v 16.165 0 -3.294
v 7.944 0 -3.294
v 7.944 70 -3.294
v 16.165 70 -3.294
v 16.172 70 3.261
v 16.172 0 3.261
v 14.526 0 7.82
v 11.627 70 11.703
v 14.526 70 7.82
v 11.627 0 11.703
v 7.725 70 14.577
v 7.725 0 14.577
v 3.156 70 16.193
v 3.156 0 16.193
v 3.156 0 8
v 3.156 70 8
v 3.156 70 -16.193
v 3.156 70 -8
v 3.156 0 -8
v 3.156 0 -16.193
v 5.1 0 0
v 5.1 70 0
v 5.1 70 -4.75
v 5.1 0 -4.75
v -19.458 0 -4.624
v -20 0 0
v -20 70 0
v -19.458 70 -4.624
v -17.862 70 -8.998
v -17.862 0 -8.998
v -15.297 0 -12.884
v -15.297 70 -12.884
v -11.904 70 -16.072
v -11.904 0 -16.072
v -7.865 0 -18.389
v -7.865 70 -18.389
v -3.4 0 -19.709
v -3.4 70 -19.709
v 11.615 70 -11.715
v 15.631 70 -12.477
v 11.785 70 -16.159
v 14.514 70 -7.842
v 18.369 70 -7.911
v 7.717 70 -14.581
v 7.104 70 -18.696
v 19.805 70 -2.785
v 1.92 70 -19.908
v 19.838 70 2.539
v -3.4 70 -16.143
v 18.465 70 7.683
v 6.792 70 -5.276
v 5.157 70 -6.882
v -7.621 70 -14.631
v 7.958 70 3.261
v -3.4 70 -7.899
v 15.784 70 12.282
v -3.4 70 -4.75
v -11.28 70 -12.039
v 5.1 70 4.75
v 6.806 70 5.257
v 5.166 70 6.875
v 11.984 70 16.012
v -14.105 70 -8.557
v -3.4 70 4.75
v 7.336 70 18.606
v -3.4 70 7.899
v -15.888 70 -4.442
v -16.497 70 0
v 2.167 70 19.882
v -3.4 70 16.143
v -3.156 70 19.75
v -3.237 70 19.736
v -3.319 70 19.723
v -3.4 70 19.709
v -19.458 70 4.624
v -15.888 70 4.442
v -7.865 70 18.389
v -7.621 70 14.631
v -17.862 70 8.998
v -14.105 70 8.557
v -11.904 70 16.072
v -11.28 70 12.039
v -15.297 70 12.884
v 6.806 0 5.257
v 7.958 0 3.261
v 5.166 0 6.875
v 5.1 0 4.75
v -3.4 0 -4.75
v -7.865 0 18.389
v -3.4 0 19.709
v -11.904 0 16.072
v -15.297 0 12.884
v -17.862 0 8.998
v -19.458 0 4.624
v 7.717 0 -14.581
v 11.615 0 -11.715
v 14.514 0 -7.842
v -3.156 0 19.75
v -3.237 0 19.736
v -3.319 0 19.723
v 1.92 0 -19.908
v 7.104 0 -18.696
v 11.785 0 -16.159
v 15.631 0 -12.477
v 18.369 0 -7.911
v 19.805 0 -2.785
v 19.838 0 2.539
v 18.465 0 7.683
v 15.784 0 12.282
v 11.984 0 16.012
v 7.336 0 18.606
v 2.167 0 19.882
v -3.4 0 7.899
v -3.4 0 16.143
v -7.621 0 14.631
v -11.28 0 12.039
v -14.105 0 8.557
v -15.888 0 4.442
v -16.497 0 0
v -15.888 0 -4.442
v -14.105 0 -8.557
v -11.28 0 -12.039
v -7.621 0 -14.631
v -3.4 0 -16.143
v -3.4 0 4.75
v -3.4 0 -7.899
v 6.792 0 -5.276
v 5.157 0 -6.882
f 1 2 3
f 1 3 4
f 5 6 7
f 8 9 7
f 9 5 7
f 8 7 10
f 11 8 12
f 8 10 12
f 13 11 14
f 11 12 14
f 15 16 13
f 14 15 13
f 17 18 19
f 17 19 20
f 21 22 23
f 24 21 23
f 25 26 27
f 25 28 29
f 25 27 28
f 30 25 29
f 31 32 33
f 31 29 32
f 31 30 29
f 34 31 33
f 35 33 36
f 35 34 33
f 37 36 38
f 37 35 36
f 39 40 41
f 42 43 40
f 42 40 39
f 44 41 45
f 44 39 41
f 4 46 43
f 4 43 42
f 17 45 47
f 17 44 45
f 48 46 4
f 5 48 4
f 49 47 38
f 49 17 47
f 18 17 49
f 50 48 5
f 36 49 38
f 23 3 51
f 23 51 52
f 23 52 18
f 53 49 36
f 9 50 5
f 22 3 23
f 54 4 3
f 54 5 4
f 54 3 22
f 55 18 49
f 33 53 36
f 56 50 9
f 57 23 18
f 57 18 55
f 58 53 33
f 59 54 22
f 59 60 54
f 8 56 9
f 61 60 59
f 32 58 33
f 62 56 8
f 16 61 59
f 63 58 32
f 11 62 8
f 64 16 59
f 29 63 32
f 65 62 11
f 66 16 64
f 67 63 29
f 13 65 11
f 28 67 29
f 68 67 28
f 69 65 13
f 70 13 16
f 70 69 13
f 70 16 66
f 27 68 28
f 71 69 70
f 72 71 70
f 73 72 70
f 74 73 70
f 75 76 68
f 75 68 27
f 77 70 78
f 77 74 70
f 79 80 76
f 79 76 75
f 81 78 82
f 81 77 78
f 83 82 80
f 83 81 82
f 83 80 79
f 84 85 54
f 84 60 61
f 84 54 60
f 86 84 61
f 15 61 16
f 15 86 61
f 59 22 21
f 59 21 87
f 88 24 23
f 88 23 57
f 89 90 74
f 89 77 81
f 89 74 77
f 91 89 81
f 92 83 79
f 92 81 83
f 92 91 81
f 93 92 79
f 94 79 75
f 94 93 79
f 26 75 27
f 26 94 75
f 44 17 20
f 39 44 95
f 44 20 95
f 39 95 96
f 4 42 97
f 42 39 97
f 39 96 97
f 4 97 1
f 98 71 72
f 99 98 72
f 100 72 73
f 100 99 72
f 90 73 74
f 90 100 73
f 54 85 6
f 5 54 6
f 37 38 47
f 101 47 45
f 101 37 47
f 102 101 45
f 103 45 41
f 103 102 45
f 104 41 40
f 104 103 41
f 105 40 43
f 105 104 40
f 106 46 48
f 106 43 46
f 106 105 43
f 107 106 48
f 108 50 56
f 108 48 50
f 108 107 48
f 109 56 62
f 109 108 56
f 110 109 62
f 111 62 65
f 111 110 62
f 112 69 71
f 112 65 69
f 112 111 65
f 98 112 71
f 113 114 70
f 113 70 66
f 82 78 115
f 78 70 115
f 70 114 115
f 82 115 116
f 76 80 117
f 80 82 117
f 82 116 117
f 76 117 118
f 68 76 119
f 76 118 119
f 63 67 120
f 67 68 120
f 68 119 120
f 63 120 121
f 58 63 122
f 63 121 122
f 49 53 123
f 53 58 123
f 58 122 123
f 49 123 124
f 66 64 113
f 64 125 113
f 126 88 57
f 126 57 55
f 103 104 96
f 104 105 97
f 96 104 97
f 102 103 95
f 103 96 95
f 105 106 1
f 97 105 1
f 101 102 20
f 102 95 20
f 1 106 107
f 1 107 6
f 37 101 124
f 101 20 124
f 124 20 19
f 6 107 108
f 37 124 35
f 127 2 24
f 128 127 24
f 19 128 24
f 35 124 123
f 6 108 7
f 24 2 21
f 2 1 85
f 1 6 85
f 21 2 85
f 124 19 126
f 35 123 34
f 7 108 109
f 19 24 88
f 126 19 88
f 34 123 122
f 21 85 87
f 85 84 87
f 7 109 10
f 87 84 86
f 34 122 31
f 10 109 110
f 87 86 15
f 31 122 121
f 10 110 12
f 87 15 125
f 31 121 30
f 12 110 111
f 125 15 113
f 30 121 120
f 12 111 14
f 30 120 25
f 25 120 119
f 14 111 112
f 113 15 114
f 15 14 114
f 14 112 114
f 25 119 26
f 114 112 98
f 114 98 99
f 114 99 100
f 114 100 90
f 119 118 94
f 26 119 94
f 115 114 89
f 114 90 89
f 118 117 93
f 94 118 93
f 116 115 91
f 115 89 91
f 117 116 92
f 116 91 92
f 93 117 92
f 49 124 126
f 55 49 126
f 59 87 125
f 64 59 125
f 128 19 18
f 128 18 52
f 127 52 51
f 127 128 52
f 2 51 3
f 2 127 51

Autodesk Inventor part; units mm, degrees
ref_plane "YZ Plane" through (0, 0, 0) normal (1, 0, 0) x (0, 1, 0)
ref_plane "XZ Plane" through (0, 0, 0) normal (0, 1, 0) x (-1, 0, 0)
ref_plane "XY Plane" through (0, 0, 0) normal (0, 0, 1) x (1, 0, 0)
sketch "Sketch1" plane through (0, 0, 0) normal (0, 1, 0) x (-1, 0, 0)
  circle A0 centre (0, 0) radius 20
  line L0 (-8.6, 0) -> (3.4, 0)
  line L1 (3.4, 0) -> (3.4, 7.8994)
  line L2 (3.4, 0) -> (3.4, -7.8994)
  line L3 (3.4, 0) -> (-5.1, 0)
  line L4 (-5.1, 0) -> (-5.1, -4.75)
  line L5 (-5.1, -4.75) -> (3.4, -4.75)
  line L6 (3.4, -4.75) -> (3.4, 0)
  line L7 (-5.1, 0) -> (-5.1, 4.75)
  line L8 (-5.1, 4.75) -> (3.4, 4.75)
  line L9 (-3.1555, 7.8994) -> (-3.1555, 16.1927)
  line L10 (-7.9441, -3.2941) -> (-16.1651, -3.2941)
  line L11 (3.1555, 19.7495) -> (3.4, 19.7495)
  line L12 (-3.1555, -7.8994) -> (-3.1555, -16.1927)
  line L13 (-7.9441, 3.2613) -> (-16.1717, 3.2613)
  line L14 (3.4, 19.7495) -> (3.4, 19.7089)
  line L15 (3.4, 16.1431) -> (3.4, 7.8994)
  line L16 (-8.6, -0.0164) -> (-7.9441, -0.0164)
  line L17 (3.4, -19.7495) -> (3.4, -19.7089)
  line L18 (3.4, -16.1431) -> (3.4, -7.8994)
  arc A1 (-7.9441, -3.2941) -> (-3.1555, -8.0002) centre (0, 0) ccw
  arc A2 (-3.1555, 8.0002) -> (-7.9576, 3.2613) centre (0, 0) ccw
  arc A3 (-8.6, 0) -> (-8.6, -0.0164) centre (0, 0) ccw
  arc A4 (3.4, -16.1431) -> (3.4, 16.1431) centre (0, 0) ccw
  arc A5 (-3.1555, 16.1927) -> (-16.1717, 3.2613) centre (0, 0) ccw
  arc A6 (-16.1651, -3.2941) -> (-3.1555, -16.1927) centre (0, 0) ccw
  point P0 (-3.1555, 19.7495)
  point P1 (-19.7269, -3.2941)
  point P2 (-3.1555, -19.7495)
  point P3 (-19.7269, 3.2613)
  dimension "d0" = 40
  dimension "d2" = 12
  dimension "d4" = 8.5
extrude "Extrusion1" add sketch "Sketch1" along normal blind 70 contours A0
ref_plane "Work Plane1" through (0, 34.925, 0) normal (0, -1, 0) x (1, 0, 0)
equation "\"d6\" = 0.5 * d5"
equation "\"d5\" = 6.555455"
properties part number "axel"
